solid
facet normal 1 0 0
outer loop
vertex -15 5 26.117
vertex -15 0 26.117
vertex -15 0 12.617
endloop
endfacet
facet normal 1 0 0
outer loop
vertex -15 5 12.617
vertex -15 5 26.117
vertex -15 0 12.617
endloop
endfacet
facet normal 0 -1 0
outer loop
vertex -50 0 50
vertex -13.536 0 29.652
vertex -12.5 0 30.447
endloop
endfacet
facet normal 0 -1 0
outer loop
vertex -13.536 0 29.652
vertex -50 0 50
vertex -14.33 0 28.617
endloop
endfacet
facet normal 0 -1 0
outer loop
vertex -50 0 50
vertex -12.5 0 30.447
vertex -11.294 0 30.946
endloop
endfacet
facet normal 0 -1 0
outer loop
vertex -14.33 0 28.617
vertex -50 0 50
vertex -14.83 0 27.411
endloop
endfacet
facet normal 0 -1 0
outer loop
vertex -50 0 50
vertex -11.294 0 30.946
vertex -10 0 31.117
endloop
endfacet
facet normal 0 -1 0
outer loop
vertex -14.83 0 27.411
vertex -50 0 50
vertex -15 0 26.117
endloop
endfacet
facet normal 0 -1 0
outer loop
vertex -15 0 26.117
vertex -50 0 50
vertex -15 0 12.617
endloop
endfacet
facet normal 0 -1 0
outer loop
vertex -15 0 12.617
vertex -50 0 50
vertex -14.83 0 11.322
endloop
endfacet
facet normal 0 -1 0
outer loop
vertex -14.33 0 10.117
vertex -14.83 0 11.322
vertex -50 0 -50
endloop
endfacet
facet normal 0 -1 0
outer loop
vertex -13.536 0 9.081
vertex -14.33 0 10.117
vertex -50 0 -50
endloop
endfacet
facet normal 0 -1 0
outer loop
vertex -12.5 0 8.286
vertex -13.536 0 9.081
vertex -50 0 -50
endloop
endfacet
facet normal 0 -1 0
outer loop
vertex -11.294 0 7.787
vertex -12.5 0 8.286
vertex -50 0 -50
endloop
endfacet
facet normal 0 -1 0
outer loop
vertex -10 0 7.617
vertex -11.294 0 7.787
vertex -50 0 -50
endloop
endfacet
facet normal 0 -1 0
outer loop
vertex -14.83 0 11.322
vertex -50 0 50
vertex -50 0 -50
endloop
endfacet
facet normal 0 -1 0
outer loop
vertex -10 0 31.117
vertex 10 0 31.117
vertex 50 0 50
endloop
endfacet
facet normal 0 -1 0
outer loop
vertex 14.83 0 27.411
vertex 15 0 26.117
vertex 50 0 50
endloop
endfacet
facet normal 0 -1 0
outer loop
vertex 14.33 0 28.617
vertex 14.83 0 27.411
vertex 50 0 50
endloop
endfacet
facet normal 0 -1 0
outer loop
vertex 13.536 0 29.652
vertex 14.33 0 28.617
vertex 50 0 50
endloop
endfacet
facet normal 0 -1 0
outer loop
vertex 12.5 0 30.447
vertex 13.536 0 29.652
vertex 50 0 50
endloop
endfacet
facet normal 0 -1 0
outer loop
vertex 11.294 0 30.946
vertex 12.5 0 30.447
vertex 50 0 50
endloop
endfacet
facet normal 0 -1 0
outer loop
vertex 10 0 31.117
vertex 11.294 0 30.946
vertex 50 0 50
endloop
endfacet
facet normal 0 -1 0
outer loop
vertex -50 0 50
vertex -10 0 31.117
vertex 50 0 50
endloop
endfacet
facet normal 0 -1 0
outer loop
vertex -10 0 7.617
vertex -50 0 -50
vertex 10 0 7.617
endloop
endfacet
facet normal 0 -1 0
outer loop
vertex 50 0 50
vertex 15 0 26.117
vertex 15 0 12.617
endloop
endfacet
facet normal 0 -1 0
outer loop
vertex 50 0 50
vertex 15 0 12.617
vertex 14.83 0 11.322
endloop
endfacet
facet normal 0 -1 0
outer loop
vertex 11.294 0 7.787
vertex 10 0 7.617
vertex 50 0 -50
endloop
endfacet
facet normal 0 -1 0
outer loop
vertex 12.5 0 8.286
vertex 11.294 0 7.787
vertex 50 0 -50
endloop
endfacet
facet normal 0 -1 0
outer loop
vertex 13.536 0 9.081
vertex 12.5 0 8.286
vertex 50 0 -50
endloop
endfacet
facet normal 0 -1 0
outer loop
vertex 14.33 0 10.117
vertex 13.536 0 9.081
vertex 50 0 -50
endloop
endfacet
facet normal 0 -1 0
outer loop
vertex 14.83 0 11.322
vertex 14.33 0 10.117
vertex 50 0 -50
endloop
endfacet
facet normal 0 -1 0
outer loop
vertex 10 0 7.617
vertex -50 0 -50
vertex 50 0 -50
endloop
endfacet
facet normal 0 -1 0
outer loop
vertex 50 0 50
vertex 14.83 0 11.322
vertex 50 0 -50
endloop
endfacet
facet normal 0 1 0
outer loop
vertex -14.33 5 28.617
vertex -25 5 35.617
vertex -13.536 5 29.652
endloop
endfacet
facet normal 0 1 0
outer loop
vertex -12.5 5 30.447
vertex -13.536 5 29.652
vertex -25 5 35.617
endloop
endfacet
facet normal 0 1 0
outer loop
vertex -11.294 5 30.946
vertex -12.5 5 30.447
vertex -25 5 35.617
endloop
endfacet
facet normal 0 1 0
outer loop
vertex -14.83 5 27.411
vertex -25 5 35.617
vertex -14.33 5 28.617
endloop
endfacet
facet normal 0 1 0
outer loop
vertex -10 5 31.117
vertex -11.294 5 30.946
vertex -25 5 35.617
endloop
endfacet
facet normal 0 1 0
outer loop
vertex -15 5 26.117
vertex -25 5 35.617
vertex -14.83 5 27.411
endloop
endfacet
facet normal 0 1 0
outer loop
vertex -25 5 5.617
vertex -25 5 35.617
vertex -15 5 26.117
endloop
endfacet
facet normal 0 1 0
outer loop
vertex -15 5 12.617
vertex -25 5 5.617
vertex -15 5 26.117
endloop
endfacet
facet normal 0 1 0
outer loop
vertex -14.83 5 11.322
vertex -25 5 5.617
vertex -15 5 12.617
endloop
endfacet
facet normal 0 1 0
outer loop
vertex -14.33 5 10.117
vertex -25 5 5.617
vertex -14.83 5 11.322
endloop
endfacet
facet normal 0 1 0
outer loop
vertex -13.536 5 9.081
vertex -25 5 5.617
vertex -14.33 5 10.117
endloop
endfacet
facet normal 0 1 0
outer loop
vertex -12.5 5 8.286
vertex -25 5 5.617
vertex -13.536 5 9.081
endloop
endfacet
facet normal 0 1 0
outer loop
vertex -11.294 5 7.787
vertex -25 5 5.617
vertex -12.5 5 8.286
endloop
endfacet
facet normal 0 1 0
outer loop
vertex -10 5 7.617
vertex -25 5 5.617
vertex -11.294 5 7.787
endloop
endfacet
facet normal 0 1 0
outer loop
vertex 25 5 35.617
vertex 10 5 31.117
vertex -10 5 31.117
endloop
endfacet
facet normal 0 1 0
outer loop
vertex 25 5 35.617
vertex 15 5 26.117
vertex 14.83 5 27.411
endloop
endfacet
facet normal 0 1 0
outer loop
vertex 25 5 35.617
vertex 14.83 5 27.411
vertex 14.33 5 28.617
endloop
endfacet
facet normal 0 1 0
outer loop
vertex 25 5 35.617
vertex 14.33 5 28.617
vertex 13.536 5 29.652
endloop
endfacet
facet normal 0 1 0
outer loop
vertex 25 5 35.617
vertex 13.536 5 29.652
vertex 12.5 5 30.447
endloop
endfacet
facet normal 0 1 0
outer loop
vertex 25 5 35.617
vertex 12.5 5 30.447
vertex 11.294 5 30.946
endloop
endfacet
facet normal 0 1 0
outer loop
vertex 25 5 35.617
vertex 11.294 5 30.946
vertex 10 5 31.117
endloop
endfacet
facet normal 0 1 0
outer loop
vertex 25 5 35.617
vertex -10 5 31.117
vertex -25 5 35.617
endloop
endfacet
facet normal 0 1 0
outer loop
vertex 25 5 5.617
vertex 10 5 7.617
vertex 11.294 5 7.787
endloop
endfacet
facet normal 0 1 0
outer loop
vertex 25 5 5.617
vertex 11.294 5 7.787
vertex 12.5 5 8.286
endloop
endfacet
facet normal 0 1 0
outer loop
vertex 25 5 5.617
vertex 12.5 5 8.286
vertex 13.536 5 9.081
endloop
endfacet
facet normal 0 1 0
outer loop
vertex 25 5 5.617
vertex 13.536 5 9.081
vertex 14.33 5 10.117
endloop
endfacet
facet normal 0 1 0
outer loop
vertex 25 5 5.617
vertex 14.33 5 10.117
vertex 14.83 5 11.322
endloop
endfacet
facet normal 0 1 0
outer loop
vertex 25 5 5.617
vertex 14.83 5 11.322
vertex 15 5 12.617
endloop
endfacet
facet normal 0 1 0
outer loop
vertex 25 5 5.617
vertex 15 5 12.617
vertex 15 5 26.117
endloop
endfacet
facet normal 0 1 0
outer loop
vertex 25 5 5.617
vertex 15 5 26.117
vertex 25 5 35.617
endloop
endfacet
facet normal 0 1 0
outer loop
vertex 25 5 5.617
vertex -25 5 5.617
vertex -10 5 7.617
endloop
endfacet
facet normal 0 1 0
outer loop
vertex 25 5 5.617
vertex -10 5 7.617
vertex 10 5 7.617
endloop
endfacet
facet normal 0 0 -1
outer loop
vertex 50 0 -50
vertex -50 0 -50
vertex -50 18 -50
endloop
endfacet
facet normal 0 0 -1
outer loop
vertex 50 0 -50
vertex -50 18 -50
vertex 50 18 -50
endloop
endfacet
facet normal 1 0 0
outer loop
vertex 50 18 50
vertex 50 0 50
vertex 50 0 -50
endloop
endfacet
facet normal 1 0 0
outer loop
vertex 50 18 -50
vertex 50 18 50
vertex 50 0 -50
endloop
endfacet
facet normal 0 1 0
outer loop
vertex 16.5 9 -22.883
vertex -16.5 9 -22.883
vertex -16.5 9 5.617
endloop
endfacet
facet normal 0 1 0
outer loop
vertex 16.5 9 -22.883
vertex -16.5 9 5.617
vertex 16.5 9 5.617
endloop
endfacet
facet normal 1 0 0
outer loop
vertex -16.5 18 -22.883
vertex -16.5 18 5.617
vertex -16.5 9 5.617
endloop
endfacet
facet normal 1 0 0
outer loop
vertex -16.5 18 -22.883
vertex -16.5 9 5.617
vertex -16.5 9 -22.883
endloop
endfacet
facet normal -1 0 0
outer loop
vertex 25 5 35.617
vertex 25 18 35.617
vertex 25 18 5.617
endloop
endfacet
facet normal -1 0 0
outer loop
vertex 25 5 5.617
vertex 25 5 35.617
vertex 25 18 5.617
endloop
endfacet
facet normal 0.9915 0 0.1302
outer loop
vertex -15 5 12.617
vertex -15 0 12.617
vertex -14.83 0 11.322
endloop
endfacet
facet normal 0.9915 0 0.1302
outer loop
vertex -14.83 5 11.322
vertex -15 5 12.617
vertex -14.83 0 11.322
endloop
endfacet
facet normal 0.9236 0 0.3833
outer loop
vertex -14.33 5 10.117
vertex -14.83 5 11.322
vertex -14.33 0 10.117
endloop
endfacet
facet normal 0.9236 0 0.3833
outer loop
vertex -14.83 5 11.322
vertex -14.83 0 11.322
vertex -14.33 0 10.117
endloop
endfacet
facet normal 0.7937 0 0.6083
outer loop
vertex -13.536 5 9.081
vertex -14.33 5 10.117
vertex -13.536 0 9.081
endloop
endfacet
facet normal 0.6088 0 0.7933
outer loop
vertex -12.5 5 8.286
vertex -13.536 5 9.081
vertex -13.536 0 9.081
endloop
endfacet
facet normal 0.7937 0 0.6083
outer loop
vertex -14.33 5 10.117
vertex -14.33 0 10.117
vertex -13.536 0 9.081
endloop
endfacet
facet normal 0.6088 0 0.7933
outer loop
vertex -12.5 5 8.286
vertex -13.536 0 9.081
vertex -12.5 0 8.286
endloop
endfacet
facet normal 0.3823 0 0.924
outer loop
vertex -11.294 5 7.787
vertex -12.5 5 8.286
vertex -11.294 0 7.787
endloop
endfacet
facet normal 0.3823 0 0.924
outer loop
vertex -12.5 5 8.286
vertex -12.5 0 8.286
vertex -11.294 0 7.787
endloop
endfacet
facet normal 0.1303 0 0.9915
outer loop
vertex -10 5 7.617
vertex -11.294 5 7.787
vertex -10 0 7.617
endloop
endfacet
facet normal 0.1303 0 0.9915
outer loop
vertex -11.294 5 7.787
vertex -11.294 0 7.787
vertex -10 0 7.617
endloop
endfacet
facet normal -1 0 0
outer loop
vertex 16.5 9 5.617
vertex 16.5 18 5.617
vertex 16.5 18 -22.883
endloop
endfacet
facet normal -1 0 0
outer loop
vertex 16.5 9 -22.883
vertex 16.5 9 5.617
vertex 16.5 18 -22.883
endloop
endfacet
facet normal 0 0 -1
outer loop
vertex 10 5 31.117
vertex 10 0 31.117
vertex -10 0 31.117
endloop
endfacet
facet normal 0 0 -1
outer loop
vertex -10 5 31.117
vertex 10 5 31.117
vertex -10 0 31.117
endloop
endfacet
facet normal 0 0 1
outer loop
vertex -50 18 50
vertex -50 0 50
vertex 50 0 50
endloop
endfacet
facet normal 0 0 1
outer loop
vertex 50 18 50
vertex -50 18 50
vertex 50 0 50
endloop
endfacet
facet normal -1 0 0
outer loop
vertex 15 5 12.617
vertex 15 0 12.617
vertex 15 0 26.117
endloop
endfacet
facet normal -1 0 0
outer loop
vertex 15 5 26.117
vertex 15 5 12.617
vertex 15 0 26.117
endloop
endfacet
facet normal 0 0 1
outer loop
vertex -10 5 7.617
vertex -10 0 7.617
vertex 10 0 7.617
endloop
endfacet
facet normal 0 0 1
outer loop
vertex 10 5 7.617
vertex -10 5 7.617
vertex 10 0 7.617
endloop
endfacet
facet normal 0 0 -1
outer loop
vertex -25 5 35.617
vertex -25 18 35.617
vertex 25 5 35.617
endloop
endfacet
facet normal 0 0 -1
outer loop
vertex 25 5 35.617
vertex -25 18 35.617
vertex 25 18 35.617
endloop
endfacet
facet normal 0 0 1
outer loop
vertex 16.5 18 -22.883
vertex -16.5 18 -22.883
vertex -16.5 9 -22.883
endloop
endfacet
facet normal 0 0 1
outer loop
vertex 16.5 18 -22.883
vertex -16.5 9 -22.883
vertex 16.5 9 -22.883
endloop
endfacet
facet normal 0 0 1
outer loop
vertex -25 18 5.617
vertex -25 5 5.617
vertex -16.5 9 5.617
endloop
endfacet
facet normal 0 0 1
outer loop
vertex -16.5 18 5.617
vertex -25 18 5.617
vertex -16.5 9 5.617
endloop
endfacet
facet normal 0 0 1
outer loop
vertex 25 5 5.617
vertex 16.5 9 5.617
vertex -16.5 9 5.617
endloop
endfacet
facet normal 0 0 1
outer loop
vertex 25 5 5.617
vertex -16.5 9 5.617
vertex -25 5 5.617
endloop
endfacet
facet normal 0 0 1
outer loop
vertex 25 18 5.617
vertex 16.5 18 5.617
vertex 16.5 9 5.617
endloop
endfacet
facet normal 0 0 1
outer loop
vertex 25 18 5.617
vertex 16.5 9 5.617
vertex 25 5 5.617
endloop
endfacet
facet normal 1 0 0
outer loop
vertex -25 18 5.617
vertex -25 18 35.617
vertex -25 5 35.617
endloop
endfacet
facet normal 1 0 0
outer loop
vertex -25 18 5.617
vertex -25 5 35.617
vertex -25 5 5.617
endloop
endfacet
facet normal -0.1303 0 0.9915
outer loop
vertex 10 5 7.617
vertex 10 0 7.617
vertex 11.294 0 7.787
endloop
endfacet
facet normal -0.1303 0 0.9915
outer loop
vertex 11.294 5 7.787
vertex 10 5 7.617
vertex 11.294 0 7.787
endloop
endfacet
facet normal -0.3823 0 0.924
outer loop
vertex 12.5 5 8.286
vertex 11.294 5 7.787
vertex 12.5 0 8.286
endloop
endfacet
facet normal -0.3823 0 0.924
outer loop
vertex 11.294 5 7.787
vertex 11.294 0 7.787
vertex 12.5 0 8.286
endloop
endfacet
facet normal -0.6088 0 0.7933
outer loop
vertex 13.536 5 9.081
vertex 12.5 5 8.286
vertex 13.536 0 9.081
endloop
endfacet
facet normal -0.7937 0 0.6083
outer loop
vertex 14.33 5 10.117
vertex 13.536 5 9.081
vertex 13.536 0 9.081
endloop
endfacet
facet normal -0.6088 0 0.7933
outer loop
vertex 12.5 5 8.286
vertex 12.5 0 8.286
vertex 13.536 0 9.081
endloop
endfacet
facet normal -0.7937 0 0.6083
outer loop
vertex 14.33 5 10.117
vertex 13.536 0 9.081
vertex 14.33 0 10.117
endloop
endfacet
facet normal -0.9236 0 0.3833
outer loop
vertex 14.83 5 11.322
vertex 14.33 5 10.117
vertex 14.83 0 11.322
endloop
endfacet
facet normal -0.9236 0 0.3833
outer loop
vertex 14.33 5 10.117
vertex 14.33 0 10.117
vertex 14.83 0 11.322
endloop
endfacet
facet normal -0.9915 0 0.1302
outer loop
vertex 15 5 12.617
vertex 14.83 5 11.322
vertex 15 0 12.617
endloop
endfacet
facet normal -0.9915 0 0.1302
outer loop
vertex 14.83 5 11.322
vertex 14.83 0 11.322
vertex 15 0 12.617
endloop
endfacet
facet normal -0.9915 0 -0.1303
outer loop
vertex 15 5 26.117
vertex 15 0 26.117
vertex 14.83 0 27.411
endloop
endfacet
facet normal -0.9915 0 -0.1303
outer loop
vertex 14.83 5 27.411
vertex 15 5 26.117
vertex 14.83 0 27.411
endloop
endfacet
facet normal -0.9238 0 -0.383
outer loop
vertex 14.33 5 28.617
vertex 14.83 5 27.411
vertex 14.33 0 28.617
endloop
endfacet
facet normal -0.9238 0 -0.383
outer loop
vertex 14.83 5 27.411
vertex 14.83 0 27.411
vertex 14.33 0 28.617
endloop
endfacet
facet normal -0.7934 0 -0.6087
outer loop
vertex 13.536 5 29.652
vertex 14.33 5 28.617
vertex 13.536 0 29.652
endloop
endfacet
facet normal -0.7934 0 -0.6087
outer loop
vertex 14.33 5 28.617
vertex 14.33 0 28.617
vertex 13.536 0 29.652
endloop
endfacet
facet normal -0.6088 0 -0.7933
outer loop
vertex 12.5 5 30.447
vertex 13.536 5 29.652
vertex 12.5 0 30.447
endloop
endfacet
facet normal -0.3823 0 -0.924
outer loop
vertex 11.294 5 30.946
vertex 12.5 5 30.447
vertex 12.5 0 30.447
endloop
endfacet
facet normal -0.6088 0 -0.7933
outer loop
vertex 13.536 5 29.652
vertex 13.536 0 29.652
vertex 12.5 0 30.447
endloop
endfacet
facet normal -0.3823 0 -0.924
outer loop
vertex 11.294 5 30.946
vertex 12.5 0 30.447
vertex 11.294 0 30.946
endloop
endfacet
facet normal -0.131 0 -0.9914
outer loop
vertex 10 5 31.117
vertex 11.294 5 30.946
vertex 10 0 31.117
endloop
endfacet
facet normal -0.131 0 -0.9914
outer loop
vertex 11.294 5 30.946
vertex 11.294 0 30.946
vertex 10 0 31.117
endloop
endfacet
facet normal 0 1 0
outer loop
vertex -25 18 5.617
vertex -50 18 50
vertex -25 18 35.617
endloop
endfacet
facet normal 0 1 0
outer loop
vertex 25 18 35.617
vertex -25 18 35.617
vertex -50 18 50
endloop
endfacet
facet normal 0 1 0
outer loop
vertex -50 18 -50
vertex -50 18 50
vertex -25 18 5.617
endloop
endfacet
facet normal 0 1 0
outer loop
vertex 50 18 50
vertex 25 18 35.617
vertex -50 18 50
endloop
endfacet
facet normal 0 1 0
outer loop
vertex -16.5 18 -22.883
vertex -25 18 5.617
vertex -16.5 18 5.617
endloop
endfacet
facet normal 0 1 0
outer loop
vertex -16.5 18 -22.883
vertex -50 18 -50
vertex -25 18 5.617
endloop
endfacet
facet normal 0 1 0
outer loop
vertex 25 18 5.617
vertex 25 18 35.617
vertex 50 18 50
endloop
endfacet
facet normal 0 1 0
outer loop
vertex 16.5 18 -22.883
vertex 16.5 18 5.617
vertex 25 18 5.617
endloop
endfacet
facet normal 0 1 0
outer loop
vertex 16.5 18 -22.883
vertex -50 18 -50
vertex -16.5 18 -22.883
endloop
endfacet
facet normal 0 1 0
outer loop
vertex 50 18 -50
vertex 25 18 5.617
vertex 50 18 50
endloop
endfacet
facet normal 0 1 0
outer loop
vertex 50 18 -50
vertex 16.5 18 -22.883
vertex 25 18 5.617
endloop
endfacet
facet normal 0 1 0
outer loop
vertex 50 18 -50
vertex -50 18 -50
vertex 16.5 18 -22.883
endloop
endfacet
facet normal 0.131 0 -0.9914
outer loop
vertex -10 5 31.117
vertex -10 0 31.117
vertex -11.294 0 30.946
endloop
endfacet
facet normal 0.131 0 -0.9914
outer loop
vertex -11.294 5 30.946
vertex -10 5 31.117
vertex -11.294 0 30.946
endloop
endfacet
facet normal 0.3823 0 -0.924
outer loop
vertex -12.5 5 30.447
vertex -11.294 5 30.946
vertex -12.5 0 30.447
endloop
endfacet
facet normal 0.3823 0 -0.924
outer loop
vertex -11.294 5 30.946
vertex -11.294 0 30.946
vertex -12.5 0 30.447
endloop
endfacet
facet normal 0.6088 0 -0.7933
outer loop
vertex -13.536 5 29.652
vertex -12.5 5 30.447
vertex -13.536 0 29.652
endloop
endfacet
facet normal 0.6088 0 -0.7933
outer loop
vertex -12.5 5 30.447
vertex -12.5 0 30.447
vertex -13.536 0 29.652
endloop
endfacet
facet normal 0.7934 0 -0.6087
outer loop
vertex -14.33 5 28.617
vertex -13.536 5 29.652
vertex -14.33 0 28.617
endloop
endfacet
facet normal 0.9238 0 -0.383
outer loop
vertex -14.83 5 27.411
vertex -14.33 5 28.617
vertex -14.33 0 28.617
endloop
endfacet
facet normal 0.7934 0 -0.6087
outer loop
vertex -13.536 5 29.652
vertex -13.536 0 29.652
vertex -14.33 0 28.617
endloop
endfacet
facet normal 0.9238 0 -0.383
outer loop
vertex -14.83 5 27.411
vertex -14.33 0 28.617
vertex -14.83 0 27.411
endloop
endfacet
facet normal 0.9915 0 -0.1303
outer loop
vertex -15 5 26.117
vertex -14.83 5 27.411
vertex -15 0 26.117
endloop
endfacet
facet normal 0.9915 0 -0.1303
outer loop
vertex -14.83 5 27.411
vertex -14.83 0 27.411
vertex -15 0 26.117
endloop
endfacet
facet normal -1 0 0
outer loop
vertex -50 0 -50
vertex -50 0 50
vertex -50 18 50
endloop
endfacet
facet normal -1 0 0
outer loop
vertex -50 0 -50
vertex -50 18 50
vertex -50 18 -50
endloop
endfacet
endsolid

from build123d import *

# Parameters (mm, degrees)
SKETCH_1_W               = 100
SKETCH_1_H               = 100
EXTRUDE_1_DEPTH          = 18
SKETCH_2_W               = 50
SKETCH_2_H               = 30
CUT_EXTRUDE_1_DEPTH      = 13
CUT_EXTRUDE_2_DEPTH      = 72.895757872
CUT_EXTRUDE_2_DEPTH_BACK = 72.895757872
SKETCH_4_W               = 33
SKETCH_4_H               = 28.5
CUT_EXTRUDE_3_DEPTH      = 9


with BuildPart() as part:
    # Эскиз1 → Бобышка-Вытянуть1 (new body)
    with BuildSketch(Plane(origin=(0, 0, 0), x_dir=(1, 0, 0), z_dir=(0, 1, 0))):
        Rectangle(SKETCH_1_W, SKETCH_1_H)
    extrude(amount=EXTRUDE_1_DEPTH)

    # Эскиз2 → Вырез-Вытянуть1 (cut)
    with BuildSketch(Plane(origin=(0, 18, 0), x_dir=(1, 0, 0), z_dir=(0, 1, 0))):
        with Locations((0, -20.616579454)):
            Rectangle(SKETCH_2_W, SKETCH_2_H)
    extrude(amount=-CUT_EXTRUDE_1_DEPTH, mode=Mode.SUBTRACT)

    # Эскиз3 → Вырез-Вытянуть2 (cut, two sides: drawn at the far end of the back side and taken through both)
    with BuildSketch(Plane(origin=(0, 5, 0), x_dir=(1, 0, 0), z_dir=(0, 1, 0)).offset(-CUT_EXTRUDE_2_DEPTH_BACK)):
        with BuildLine():
            Line((10, -31.116579454), (-10, -31.116579454))
            ThreePointArc((-10, -31.116579454), (-13.535533906, -29.65211336), (-15, -26.116579454))
            Line((-15, -26.116579454), (-15, -12.616579454))
            ThreePointArc((-15, -12.616579454), (-13.535533906, -9.081045548), (-10, -7.616579454))
            Line((-10, -7.616579454), (10, -7.616579454))
            ThreePointArc((10, -7.616579454), (13.535533906, -9.081045548), (15, -12.616579454))
            Line((15, -12.616579454), (15, -26.116579454))
            ThreePointArc((15, -26.116579454), (13.535533906, -29.65211336), (10, -31.116579454))
        make_face()
    extrude(amount=CUT_EXTRUDE_2_DEPTH + CUT_EXTRUDE_2_DEPTH_BACK, mode=Mode.SUBTRACT)

    # Эскиз4 → Вырез-Вытянуть3 (cut)
    with BuildSketch(Plane(origin=(0, 18, 0), x_dir=(1, 0, 0), z_dir=(0, 1, 0))):
        with Locations((0, 8.633420546)):
            Rectangle(SKETCH_4_W, SKETCH_4_H)
    extrude(amount=-CUT_EXTRUDE_3_DEPTH, mode=Mode.SUBTRACT)


solid = part.part
